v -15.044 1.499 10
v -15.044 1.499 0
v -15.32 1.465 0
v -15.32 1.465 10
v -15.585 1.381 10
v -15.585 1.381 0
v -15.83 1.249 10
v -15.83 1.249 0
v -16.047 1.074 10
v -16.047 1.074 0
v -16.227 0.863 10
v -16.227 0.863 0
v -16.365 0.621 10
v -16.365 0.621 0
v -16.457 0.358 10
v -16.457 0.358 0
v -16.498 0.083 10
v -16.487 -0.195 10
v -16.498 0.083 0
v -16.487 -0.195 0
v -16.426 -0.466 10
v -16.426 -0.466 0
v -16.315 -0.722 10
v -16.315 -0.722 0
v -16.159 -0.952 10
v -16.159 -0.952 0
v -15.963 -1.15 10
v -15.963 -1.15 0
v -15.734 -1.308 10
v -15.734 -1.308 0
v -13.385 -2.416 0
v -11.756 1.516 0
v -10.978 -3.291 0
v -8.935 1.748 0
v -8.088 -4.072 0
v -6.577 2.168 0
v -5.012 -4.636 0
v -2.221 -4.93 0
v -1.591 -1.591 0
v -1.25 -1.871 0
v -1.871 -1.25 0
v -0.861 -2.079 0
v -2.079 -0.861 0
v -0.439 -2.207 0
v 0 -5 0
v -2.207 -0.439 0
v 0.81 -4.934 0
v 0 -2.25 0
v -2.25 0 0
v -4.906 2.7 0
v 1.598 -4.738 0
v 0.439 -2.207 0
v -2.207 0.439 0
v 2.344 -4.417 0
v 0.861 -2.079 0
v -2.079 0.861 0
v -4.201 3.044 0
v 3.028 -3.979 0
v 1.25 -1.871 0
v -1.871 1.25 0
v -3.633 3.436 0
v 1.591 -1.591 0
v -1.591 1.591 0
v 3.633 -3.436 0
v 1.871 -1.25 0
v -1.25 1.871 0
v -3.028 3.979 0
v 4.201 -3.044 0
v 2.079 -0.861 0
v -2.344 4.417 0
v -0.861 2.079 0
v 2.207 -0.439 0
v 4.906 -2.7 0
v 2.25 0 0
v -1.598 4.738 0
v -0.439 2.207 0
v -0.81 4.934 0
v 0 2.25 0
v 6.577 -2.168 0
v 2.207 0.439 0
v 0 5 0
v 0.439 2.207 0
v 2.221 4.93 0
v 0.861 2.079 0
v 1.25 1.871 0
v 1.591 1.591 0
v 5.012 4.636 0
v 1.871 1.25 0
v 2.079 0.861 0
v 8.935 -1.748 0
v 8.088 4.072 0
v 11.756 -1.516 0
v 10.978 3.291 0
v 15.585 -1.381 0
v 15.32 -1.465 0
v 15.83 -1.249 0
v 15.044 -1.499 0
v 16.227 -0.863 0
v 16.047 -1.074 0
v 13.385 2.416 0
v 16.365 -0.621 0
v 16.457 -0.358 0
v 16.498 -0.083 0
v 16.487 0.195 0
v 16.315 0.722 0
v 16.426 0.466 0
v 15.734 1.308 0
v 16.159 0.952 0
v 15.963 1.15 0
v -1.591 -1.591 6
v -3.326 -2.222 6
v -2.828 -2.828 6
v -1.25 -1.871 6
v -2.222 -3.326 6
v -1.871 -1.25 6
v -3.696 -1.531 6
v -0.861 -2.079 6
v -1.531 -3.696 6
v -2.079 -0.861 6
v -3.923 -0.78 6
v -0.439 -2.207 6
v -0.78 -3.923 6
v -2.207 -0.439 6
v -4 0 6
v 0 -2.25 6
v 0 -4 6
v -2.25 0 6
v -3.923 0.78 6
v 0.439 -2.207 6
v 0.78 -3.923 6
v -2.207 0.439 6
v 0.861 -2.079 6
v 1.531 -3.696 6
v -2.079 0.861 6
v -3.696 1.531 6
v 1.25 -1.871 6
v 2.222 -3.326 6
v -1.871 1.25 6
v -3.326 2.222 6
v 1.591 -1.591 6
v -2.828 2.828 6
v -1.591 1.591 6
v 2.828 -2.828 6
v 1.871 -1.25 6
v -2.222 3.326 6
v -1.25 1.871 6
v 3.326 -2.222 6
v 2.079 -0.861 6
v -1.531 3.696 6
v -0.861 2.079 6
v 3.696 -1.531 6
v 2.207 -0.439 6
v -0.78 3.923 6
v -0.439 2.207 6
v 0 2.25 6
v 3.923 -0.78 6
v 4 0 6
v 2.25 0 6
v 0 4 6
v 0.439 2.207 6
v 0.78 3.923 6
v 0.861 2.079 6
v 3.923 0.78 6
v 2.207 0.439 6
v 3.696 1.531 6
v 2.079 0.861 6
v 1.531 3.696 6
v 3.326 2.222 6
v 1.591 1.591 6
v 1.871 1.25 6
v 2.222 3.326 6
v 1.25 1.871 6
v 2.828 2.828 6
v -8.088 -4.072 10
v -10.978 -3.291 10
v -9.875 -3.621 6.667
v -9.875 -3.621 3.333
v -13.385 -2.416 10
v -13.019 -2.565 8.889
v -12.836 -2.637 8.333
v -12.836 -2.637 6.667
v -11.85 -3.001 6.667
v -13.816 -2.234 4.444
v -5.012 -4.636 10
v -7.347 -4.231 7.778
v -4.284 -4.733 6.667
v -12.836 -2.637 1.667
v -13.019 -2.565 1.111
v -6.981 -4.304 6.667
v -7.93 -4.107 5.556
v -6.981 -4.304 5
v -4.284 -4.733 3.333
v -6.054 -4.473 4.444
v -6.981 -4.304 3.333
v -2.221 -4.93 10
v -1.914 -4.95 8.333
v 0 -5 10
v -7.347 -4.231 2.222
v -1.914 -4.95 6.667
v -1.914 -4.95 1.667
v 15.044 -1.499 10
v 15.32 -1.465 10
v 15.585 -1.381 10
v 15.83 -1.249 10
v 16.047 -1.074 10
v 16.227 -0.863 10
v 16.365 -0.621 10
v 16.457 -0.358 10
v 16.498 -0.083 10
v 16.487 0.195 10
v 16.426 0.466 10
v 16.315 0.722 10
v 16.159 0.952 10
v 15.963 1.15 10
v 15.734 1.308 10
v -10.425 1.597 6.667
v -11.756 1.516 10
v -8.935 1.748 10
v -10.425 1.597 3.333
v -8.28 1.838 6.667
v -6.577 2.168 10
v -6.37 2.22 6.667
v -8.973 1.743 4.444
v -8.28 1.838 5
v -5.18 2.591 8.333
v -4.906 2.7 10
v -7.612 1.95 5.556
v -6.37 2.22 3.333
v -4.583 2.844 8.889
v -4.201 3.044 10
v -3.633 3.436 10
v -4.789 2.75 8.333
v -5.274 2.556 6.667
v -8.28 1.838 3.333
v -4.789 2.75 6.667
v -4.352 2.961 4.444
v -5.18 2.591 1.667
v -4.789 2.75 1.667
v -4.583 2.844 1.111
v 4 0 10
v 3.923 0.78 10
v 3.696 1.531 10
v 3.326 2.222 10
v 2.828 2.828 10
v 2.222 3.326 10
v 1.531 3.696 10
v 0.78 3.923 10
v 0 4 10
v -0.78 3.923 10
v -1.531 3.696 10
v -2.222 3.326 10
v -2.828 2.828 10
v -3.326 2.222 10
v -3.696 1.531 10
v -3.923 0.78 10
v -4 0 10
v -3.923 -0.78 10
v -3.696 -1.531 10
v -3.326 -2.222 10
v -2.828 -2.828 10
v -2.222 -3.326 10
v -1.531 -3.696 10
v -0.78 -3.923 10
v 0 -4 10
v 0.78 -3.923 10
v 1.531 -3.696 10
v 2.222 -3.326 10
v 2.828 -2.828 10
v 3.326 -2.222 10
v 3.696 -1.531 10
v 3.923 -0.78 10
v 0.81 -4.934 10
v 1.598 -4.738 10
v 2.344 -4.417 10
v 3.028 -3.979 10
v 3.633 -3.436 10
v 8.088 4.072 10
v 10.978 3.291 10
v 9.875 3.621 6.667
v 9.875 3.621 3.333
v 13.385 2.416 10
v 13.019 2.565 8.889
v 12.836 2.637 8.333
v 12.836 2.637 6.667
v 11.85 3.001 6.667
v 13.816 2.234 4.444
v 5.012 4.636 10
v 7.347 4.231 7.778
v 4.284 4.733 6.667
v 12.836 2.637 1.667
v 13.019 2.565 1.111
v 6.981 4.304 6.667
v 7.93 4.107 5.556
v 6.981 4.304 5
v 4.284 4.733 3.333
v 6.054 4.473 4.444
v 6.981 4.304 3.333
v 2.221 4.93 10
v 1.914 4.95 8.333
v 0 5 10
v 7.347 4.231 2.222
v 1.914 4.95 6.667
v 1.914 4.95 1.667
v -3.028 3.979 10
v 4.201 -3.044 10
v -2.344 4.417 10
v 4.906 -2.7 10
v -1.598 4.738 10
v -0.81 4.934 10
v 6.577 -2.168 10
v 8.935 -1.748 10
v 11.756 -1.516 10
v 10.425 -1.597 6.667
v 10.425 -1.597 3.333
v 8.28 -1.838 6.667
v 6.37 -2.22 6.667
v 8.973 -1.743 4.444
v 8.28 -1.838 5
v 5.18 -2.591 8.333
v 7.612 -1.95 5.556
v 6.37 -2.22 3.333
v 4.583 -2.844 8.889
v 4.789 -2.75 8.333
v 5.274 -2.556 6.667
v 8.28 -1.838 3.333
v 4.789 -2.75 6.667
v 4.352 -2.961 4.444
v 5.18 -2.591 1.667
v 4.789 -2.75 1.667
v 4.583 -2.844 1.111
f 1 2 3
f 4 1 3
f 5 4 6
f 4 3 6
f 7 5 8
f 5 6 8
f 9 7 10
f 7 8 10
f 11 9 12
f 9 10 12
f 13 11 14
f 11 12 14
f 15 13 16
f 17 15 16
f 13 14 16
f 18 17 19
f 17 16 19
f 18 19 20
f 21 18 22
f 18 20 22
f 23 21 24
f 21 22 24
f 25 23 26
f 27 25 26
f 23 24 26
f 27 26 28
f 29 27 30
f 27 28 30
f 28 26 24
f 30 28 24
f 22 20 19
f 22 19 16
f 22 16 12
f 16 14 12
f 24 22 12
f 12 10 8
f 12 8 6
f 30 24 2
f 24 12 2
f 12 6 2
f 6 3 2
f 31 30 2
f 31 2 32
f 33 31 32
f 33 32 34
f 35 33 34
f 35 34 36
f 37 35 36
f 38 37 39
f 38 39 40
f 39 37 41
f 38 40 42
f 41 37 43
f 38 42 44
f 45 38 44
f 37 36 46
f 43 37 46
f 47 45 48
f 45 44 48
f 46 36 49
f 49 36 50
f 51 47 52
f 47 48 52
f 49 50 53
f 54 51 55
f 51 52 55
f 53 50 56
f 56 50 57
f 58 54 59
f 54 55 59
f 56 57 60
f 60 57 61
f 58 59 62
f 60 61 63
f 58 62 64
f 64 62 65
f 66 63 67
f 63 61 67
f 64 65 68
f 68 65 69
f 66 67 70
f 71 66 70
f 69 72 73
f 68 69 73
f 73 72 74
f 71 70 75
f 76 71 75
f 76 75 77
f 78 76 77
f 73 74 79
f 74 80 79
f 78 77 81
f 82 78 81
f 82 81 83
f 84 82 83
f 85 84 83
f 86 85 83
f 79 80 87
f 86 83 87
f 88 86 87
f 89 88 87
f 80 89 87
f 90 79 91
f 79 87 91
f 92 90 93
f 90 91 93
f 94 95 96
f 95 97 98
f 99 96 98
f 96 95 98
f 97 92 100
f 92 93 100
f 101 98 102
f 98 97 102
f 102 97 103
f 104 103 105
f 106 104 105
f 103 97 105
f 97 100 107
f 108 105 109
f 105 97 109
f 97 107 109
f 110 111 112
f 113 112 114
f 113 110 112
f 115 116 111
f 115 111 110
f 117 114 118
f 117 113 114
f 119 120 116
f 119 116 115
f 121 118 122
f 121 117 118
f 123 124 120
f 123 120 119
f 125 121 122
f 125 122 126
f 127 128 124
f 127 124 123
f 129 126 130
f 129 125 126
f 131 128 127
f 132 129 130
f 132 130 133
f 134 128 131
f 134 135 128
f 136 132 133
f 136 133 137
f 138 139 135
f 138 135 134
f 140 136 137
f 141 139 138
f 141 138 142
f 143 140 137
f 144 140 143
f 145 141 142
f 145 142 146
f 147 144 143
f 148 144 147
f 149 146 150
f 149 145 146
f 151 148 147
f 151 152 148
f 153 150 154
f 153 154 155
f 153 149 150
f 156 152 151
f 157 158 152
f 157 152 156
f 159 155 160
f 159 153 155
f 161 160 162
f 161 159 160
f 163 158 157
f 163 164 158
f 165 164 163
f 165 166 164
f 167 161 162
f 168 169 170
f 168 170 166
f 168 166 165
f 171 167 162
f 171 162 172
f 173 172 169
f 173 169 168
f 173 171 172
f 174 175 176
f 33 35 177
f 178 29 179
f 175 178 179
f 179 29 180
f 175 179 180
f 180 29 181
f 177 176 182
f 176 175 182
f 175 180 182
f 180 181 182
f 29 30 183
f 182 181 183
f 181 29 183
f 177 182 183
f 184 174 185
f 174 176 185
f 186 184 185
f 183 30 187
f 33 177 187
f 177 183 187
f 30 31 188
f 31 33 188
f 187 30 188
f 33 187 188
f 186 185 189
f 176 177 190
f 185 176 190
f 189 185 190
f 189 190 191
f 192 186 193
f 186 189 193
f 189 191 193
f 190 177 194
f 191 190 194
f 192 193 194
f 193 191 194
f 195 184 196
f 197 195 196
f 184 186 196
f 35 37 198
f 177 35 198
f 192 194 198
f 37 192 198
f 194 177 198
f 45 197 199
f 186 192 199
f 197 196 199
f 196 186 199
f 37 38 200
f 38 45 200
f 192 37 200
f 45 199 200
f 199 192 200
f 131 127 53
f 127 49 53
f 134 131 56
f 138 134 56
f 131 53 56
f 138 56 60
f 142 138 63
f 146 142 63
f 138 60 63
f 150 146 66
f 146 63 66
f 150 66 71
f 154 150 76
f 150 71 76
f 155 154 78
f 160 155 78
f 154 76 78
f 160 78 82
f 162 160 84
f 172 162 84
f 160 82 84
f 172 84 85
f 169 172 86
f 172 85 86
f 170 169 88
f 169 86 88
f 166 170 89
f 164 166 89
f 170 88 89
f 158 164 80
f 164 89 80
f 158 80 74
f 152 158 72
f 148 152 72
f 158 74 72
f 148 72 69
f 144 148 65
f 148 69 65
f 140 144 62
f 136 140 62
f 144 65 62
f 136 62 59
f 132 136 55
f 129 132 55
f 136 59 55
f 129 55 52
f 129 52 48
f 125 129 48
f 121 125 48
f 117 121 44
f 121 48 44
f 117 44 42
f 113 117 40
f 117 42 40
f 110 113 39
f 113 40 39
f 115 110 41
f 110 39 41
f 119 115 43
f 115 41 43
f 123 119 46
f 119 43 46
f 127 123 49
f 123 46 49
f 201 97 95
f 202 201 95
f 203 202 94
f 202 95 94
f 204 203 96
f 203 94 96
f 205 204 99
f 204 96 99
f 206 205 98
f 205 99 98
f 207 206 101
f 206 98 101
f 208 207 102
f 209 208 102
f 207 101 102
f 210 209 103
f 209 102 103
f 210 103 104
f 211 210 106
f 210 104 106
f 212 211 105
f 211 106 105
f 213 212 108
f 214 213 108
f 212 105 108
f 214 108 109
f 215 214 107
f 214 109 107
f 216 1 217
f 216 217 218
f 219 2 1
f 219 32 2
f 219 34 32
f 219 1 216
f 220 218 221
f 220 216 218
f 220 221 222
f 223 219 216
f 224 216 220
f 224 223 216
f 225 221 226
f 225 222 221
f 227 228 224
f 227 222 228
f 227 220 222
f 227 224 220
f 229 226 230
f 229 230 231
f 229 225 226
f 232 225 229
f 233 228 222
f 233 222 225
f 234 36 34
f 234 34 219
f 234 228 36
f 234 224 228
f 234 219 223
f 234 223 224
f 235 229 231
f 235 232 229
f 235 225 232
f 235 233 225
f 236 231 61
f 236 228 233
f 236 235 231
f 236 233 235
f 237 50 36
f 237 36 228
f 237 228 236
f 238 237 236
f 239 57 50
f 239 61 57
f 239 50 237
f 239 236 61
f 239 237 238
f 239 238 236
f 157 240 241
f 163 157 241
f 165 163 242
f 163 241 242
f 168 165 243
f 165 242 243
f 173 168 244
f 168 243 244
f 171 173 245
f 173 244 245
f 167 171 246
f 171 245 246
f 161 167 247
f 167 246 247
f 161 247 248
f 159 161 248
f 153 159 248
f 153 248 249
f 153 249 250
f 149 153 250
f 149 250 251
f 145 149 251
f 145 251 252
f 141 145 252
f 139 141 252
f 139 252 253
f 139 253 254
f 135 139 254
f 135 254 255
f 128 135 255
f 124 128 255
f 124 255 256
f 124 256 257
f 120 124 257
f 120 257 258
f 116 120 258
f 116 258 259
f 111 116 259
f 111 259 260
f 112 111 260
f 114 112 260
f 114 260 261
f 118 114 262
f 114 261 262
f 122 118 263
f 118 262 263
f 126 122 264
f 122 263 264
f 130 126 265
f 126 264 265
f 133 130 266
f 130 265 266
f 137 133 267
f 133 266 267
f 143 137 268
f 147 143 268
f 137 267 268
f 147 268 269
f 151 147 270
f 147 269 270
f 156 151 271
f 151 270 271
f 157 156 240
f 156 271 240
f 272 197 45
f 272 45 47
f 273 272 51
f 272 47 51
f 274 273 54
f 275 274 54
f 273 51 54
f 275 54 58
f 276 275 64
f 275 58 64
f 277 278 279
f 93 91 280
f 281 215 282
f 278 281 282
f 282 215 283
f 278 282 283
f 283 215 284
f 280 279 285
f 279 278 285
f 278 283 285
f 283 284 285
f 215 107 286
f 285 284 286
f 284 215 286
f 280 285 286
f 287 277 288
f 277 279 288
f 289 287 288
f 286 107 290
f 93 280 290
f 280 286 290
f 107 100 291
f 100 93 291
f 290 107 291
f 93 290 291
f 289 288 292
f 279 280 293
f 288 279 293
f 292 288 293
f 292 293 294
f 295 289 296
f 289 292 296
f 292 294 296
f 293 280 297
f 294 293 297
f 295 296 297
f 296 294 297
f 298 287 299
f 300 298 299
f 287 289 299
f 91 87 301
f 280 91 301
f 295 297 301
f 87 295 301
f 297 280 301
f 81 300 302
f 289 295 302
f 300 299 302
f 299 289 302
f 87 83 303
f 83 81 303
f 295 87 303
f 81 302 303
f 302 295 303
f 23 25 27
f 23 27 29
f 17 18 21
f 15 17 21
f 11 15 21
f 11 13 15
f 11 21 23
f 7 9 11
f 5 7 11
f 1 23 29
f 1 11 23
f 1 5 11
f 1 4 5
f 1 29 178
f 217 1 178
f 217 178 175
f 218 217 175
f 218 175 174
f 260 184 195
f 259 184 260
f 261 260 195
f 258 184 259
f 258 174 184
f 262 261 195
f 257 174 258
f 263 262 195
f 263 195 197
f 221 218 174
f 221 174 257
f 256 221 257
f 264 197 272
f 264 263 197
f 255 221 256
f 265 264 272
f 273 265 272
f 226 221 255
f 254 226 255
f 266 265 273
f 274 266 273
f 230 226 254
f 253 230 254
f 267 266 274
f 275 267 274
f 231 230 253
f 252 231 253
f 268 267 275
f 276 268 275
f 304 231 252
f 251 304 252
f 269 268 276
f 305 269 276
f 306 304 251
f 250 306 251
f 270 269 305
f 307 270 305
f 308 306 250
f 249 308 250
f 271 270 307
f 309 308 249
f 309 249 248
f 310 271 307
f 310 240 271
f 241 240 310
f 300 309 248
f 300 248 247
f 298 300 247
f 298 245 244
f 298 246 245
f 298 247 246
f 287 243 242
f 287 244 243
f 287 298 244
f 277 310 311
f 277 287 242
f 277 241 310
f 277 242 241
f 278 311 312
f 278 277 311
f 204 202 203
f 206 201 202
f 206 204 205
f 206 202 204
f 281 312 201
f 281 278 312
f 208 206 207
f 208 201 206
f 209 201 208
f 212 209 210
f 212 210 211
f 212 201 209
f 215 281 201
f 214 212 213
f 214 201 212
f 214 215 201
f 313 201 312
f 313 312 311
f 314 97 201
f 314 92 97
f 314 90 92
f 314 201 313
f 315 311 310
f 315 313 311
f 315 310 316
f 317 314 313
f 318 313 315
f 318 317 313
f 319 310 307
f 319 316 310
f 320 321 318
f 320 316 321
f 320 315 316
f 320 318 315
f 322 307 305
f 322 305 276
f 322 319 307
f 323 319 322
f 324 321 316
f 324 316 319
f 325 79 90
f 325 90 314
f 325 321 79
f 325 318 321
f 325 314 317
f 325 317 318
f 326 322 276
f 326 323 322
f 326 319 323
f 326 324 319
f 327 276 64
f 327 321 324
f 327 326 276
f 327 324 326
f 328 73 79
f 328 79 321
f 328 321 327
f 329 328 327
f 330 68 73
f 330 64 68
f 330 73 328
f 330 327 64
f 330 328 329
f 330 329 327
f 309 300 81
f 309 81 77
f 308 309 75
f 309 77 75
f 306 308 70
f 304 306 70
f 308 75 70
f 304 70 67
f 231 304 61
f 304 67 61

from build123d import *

# Parameters (mm, degrees)
EXTRUDE_1_DEPTH             = 10
HOLE_WIZARD_M41_D           = 4.5
HOLE_WIZARD_M41_CBORE_D     = 8
HOLE_WIZARD_M41_CBORE_DEPTH = 4


with BuildPart() as part:
    # Эскиз1 → Бобышка-Вытянуть1 (new body)
    with BuildSketch(Plane.XY):
        with BuildLine():
            ThreePointArc((0, -5), (1.97749323, -4.592332798), (3.632522807, -3.43580821))
            add(Edge.make_bspline(
                [(15.044141894, -1.499350357), (10.394641273, -1.355433826), (5.459325404, -1.902106002), (3.632522807, -3.43580821)],
                knots=[0, 0, 0, 0, 1, 1, 1, 1], degree=3))
            ThreePointArc((15.044141894, -1.499350357), (16.456610687, -0.358169384), (15.734424867, 1.307906768))
            add(Edge.make_bspline(
                [(15.734424867, 1.307906768), (10.086793818, 4.339667199), (3.284920128, 5.036214544), (0, 5)],
                knots=[0, 0, 0, 0, 1, 1, 1, 1], degree=3))
            ThreePointArc((0, 5), (-1.97749323, 4.592332798), (-3.632522807, 3.43580821))
            add(Edge.make_bspline(
                [(-15.044141894, 1.499350357), (-10.394641273, 1.355433826), (-5.459325404, 1.902106002), (-3.632522807, 3.43580821)],
                knots=[0, 0, 0, 0, 1, 1, 1, 1], degree=3))
            ThreePointArc((-15.044141894, 1.499350357), (-16.456610687, 0.358169384), (-15.734424867, -1.307906768))
            add(Edge.make_bspline(
                [(-15.734424867, -1.307906768), (-10.086793818, -4.339667199), (-3.284920128, -5.036214544), (0, -5)],
                knots=[0, 0, 0, 0, 1, 1, 1, 1], degree=3))
        make_face()
    extrude(amount=EXTRUDE_1_DEPTH)

    # Цековка для винта с внутренним шестигранником M41 (through all)
    with Locations(Plane.XY.offset(10)):
        with Locations((0, 0)):
            CounterBoreHole(HOLE_WIZARD_M41_D / 2, HOLE_WIZARD_M41_CBORE_D / 2, HOLE_WIZARD_M41_CBORE_DEPTH)


solid = part.part
